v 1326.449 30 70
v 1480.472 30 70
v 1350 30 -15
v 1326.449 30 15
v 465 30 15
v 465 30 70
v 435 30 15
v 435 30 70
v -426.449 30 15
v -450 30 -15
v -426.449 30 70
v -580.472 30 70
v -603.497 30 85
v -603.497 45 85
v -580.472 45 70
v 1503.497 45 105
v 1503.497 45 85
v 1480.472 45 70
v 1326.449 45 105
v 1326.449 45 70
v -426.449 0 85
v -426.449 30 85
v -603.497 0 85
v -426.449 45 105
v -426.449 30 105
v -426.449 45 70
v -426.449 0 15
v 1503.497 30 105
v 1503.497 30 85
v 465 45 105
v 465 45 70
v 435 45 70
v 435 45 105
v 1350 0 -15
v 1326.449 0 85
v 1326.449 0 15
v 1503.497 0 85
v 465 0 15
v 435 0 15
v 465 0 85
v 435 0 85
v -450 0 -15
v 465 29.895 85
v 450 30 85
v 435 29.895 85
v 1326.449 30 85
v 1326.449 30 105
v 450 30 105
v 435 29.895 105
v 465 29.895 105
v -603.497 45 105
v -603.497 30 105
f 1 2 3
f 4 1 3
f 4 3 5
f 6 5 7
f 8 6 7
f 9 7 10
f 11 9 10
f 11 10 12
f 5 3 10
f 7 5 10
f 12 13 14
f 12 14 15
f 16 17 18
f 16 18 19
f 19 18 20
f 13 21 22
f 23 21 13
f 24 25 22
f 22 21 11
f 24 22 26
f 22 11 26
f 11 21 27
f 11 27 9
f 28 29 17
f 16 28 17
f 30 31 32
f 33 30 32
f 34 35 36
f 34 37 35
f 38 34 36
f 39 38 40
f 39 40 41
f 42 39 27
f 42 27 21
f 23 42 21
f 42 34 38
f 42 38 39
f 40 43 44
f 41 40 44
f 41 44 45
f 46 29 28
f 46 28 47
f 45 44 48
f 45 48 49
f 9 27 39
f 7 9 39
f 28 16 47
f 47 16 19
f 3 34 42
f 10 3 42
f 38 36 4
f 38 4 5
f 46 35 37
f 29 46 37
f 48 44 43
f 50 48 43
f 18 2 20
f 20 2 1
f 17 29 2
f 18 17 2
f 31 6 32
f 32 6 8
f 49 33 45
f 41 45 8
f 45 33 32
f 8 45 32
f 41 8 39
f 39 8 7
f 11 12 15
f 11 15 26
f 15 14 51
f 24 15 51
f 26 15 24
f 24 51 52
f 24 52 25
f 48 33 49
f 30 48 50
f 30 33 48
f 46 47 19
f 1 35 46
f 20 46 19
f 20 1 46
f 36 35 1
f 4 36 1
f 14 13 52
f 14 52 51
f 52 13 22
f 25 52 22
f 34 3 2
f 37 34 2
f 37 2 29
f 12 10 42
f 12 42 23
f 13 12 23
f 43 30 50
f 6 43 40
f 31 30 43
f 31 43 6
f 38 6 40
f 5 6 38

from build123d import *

# Parameters (mm, degrees)
SKETCH1_W           = 900
SKETCH1_H           = 30
BOSS_EXTRUDE1_DEPTH = 30
SKETCH2_W           = 15
SKETCH2_H           = 100
BOSS_EXTRUDE2_DEPTH = 30
SKETCH3_W           = 15
SKETCH3_H           = 15
BOSS_EXTRUDE3_DEPTH = 15
SKETCH4_W           = 177.04771777
SKETCH4_H           = 15
BOSS_EXTRUDE4_DEPTH = 20


with BuildPart() as part:
    # Sketch1 → Boss-Extrude1 (new body)
    with BuildSketch(Plane(origin=(0, 0, 0), x_dir=(1, 0, 0), z_dir=(0, 1, 0))):
        Rectangle(SKETCH1_W, SKETCH1_H)
    extrude(amount=BOSS_EXTRUDE1_DEPTH)

    # Sketch2 → Boss-Extrude2 (add)
    with BuildSketch(Plane(origin=(0, 30, 0), x_dir=(1, 0, 0), z_dir=(0, 1, 0))):
        Polygon((-450, 15), (-603.496801426, -85), (-426.449083656, -85), (-426.449083656, 15), align=None)
        with Locations((442.5, -35)):
            Rectangle(SKETCH2_W, SKETCH2_H)
    extrude(amount=-BOSS_EXTRUDE2_DEPTH)

    # Sketch3 → Boss-Extrude3 (add)
    with BuildSketch(Plane(origin=(0, 30, 0), x_dir=(1, 0, 0), z_dir=(0, 1, 0))):
        Polygon((-603.496801426, -85), (-580.472281212, -70), (-426.449083656, -70), (-426.449083656, -85), align=None)
        with Locations((442.5, -77.5)):
            Rectangle(SKETCH3_W, SKETCH3_H)
    extrude(amount=BOSS_EXTRUDE3_DEPTH)

    # Sketch4 → Boss-Extrude4 (add)
    with BuildSketch(Plane.XY.offset(85)):
        with Locations((-514.972942541, 37.5)):
            Rectangle(SKETCH4_W, SKETCH4_H)
        Polygon((435, 45), (450, 45), (450, 30), (435, 29.894509732), align=None)
    extrude(amount=BOSS_EXTRUDE4_DEPTH)

    # Mirror1: part across plane


with BuildPart() as part_1:
    add(part.part)
    add(part.part.mirror(Plane(origin=(450, 30, -15), x_dir=(0, 0, 1), z_dir=(-1, 0, 0))))


solid = part_1.part
